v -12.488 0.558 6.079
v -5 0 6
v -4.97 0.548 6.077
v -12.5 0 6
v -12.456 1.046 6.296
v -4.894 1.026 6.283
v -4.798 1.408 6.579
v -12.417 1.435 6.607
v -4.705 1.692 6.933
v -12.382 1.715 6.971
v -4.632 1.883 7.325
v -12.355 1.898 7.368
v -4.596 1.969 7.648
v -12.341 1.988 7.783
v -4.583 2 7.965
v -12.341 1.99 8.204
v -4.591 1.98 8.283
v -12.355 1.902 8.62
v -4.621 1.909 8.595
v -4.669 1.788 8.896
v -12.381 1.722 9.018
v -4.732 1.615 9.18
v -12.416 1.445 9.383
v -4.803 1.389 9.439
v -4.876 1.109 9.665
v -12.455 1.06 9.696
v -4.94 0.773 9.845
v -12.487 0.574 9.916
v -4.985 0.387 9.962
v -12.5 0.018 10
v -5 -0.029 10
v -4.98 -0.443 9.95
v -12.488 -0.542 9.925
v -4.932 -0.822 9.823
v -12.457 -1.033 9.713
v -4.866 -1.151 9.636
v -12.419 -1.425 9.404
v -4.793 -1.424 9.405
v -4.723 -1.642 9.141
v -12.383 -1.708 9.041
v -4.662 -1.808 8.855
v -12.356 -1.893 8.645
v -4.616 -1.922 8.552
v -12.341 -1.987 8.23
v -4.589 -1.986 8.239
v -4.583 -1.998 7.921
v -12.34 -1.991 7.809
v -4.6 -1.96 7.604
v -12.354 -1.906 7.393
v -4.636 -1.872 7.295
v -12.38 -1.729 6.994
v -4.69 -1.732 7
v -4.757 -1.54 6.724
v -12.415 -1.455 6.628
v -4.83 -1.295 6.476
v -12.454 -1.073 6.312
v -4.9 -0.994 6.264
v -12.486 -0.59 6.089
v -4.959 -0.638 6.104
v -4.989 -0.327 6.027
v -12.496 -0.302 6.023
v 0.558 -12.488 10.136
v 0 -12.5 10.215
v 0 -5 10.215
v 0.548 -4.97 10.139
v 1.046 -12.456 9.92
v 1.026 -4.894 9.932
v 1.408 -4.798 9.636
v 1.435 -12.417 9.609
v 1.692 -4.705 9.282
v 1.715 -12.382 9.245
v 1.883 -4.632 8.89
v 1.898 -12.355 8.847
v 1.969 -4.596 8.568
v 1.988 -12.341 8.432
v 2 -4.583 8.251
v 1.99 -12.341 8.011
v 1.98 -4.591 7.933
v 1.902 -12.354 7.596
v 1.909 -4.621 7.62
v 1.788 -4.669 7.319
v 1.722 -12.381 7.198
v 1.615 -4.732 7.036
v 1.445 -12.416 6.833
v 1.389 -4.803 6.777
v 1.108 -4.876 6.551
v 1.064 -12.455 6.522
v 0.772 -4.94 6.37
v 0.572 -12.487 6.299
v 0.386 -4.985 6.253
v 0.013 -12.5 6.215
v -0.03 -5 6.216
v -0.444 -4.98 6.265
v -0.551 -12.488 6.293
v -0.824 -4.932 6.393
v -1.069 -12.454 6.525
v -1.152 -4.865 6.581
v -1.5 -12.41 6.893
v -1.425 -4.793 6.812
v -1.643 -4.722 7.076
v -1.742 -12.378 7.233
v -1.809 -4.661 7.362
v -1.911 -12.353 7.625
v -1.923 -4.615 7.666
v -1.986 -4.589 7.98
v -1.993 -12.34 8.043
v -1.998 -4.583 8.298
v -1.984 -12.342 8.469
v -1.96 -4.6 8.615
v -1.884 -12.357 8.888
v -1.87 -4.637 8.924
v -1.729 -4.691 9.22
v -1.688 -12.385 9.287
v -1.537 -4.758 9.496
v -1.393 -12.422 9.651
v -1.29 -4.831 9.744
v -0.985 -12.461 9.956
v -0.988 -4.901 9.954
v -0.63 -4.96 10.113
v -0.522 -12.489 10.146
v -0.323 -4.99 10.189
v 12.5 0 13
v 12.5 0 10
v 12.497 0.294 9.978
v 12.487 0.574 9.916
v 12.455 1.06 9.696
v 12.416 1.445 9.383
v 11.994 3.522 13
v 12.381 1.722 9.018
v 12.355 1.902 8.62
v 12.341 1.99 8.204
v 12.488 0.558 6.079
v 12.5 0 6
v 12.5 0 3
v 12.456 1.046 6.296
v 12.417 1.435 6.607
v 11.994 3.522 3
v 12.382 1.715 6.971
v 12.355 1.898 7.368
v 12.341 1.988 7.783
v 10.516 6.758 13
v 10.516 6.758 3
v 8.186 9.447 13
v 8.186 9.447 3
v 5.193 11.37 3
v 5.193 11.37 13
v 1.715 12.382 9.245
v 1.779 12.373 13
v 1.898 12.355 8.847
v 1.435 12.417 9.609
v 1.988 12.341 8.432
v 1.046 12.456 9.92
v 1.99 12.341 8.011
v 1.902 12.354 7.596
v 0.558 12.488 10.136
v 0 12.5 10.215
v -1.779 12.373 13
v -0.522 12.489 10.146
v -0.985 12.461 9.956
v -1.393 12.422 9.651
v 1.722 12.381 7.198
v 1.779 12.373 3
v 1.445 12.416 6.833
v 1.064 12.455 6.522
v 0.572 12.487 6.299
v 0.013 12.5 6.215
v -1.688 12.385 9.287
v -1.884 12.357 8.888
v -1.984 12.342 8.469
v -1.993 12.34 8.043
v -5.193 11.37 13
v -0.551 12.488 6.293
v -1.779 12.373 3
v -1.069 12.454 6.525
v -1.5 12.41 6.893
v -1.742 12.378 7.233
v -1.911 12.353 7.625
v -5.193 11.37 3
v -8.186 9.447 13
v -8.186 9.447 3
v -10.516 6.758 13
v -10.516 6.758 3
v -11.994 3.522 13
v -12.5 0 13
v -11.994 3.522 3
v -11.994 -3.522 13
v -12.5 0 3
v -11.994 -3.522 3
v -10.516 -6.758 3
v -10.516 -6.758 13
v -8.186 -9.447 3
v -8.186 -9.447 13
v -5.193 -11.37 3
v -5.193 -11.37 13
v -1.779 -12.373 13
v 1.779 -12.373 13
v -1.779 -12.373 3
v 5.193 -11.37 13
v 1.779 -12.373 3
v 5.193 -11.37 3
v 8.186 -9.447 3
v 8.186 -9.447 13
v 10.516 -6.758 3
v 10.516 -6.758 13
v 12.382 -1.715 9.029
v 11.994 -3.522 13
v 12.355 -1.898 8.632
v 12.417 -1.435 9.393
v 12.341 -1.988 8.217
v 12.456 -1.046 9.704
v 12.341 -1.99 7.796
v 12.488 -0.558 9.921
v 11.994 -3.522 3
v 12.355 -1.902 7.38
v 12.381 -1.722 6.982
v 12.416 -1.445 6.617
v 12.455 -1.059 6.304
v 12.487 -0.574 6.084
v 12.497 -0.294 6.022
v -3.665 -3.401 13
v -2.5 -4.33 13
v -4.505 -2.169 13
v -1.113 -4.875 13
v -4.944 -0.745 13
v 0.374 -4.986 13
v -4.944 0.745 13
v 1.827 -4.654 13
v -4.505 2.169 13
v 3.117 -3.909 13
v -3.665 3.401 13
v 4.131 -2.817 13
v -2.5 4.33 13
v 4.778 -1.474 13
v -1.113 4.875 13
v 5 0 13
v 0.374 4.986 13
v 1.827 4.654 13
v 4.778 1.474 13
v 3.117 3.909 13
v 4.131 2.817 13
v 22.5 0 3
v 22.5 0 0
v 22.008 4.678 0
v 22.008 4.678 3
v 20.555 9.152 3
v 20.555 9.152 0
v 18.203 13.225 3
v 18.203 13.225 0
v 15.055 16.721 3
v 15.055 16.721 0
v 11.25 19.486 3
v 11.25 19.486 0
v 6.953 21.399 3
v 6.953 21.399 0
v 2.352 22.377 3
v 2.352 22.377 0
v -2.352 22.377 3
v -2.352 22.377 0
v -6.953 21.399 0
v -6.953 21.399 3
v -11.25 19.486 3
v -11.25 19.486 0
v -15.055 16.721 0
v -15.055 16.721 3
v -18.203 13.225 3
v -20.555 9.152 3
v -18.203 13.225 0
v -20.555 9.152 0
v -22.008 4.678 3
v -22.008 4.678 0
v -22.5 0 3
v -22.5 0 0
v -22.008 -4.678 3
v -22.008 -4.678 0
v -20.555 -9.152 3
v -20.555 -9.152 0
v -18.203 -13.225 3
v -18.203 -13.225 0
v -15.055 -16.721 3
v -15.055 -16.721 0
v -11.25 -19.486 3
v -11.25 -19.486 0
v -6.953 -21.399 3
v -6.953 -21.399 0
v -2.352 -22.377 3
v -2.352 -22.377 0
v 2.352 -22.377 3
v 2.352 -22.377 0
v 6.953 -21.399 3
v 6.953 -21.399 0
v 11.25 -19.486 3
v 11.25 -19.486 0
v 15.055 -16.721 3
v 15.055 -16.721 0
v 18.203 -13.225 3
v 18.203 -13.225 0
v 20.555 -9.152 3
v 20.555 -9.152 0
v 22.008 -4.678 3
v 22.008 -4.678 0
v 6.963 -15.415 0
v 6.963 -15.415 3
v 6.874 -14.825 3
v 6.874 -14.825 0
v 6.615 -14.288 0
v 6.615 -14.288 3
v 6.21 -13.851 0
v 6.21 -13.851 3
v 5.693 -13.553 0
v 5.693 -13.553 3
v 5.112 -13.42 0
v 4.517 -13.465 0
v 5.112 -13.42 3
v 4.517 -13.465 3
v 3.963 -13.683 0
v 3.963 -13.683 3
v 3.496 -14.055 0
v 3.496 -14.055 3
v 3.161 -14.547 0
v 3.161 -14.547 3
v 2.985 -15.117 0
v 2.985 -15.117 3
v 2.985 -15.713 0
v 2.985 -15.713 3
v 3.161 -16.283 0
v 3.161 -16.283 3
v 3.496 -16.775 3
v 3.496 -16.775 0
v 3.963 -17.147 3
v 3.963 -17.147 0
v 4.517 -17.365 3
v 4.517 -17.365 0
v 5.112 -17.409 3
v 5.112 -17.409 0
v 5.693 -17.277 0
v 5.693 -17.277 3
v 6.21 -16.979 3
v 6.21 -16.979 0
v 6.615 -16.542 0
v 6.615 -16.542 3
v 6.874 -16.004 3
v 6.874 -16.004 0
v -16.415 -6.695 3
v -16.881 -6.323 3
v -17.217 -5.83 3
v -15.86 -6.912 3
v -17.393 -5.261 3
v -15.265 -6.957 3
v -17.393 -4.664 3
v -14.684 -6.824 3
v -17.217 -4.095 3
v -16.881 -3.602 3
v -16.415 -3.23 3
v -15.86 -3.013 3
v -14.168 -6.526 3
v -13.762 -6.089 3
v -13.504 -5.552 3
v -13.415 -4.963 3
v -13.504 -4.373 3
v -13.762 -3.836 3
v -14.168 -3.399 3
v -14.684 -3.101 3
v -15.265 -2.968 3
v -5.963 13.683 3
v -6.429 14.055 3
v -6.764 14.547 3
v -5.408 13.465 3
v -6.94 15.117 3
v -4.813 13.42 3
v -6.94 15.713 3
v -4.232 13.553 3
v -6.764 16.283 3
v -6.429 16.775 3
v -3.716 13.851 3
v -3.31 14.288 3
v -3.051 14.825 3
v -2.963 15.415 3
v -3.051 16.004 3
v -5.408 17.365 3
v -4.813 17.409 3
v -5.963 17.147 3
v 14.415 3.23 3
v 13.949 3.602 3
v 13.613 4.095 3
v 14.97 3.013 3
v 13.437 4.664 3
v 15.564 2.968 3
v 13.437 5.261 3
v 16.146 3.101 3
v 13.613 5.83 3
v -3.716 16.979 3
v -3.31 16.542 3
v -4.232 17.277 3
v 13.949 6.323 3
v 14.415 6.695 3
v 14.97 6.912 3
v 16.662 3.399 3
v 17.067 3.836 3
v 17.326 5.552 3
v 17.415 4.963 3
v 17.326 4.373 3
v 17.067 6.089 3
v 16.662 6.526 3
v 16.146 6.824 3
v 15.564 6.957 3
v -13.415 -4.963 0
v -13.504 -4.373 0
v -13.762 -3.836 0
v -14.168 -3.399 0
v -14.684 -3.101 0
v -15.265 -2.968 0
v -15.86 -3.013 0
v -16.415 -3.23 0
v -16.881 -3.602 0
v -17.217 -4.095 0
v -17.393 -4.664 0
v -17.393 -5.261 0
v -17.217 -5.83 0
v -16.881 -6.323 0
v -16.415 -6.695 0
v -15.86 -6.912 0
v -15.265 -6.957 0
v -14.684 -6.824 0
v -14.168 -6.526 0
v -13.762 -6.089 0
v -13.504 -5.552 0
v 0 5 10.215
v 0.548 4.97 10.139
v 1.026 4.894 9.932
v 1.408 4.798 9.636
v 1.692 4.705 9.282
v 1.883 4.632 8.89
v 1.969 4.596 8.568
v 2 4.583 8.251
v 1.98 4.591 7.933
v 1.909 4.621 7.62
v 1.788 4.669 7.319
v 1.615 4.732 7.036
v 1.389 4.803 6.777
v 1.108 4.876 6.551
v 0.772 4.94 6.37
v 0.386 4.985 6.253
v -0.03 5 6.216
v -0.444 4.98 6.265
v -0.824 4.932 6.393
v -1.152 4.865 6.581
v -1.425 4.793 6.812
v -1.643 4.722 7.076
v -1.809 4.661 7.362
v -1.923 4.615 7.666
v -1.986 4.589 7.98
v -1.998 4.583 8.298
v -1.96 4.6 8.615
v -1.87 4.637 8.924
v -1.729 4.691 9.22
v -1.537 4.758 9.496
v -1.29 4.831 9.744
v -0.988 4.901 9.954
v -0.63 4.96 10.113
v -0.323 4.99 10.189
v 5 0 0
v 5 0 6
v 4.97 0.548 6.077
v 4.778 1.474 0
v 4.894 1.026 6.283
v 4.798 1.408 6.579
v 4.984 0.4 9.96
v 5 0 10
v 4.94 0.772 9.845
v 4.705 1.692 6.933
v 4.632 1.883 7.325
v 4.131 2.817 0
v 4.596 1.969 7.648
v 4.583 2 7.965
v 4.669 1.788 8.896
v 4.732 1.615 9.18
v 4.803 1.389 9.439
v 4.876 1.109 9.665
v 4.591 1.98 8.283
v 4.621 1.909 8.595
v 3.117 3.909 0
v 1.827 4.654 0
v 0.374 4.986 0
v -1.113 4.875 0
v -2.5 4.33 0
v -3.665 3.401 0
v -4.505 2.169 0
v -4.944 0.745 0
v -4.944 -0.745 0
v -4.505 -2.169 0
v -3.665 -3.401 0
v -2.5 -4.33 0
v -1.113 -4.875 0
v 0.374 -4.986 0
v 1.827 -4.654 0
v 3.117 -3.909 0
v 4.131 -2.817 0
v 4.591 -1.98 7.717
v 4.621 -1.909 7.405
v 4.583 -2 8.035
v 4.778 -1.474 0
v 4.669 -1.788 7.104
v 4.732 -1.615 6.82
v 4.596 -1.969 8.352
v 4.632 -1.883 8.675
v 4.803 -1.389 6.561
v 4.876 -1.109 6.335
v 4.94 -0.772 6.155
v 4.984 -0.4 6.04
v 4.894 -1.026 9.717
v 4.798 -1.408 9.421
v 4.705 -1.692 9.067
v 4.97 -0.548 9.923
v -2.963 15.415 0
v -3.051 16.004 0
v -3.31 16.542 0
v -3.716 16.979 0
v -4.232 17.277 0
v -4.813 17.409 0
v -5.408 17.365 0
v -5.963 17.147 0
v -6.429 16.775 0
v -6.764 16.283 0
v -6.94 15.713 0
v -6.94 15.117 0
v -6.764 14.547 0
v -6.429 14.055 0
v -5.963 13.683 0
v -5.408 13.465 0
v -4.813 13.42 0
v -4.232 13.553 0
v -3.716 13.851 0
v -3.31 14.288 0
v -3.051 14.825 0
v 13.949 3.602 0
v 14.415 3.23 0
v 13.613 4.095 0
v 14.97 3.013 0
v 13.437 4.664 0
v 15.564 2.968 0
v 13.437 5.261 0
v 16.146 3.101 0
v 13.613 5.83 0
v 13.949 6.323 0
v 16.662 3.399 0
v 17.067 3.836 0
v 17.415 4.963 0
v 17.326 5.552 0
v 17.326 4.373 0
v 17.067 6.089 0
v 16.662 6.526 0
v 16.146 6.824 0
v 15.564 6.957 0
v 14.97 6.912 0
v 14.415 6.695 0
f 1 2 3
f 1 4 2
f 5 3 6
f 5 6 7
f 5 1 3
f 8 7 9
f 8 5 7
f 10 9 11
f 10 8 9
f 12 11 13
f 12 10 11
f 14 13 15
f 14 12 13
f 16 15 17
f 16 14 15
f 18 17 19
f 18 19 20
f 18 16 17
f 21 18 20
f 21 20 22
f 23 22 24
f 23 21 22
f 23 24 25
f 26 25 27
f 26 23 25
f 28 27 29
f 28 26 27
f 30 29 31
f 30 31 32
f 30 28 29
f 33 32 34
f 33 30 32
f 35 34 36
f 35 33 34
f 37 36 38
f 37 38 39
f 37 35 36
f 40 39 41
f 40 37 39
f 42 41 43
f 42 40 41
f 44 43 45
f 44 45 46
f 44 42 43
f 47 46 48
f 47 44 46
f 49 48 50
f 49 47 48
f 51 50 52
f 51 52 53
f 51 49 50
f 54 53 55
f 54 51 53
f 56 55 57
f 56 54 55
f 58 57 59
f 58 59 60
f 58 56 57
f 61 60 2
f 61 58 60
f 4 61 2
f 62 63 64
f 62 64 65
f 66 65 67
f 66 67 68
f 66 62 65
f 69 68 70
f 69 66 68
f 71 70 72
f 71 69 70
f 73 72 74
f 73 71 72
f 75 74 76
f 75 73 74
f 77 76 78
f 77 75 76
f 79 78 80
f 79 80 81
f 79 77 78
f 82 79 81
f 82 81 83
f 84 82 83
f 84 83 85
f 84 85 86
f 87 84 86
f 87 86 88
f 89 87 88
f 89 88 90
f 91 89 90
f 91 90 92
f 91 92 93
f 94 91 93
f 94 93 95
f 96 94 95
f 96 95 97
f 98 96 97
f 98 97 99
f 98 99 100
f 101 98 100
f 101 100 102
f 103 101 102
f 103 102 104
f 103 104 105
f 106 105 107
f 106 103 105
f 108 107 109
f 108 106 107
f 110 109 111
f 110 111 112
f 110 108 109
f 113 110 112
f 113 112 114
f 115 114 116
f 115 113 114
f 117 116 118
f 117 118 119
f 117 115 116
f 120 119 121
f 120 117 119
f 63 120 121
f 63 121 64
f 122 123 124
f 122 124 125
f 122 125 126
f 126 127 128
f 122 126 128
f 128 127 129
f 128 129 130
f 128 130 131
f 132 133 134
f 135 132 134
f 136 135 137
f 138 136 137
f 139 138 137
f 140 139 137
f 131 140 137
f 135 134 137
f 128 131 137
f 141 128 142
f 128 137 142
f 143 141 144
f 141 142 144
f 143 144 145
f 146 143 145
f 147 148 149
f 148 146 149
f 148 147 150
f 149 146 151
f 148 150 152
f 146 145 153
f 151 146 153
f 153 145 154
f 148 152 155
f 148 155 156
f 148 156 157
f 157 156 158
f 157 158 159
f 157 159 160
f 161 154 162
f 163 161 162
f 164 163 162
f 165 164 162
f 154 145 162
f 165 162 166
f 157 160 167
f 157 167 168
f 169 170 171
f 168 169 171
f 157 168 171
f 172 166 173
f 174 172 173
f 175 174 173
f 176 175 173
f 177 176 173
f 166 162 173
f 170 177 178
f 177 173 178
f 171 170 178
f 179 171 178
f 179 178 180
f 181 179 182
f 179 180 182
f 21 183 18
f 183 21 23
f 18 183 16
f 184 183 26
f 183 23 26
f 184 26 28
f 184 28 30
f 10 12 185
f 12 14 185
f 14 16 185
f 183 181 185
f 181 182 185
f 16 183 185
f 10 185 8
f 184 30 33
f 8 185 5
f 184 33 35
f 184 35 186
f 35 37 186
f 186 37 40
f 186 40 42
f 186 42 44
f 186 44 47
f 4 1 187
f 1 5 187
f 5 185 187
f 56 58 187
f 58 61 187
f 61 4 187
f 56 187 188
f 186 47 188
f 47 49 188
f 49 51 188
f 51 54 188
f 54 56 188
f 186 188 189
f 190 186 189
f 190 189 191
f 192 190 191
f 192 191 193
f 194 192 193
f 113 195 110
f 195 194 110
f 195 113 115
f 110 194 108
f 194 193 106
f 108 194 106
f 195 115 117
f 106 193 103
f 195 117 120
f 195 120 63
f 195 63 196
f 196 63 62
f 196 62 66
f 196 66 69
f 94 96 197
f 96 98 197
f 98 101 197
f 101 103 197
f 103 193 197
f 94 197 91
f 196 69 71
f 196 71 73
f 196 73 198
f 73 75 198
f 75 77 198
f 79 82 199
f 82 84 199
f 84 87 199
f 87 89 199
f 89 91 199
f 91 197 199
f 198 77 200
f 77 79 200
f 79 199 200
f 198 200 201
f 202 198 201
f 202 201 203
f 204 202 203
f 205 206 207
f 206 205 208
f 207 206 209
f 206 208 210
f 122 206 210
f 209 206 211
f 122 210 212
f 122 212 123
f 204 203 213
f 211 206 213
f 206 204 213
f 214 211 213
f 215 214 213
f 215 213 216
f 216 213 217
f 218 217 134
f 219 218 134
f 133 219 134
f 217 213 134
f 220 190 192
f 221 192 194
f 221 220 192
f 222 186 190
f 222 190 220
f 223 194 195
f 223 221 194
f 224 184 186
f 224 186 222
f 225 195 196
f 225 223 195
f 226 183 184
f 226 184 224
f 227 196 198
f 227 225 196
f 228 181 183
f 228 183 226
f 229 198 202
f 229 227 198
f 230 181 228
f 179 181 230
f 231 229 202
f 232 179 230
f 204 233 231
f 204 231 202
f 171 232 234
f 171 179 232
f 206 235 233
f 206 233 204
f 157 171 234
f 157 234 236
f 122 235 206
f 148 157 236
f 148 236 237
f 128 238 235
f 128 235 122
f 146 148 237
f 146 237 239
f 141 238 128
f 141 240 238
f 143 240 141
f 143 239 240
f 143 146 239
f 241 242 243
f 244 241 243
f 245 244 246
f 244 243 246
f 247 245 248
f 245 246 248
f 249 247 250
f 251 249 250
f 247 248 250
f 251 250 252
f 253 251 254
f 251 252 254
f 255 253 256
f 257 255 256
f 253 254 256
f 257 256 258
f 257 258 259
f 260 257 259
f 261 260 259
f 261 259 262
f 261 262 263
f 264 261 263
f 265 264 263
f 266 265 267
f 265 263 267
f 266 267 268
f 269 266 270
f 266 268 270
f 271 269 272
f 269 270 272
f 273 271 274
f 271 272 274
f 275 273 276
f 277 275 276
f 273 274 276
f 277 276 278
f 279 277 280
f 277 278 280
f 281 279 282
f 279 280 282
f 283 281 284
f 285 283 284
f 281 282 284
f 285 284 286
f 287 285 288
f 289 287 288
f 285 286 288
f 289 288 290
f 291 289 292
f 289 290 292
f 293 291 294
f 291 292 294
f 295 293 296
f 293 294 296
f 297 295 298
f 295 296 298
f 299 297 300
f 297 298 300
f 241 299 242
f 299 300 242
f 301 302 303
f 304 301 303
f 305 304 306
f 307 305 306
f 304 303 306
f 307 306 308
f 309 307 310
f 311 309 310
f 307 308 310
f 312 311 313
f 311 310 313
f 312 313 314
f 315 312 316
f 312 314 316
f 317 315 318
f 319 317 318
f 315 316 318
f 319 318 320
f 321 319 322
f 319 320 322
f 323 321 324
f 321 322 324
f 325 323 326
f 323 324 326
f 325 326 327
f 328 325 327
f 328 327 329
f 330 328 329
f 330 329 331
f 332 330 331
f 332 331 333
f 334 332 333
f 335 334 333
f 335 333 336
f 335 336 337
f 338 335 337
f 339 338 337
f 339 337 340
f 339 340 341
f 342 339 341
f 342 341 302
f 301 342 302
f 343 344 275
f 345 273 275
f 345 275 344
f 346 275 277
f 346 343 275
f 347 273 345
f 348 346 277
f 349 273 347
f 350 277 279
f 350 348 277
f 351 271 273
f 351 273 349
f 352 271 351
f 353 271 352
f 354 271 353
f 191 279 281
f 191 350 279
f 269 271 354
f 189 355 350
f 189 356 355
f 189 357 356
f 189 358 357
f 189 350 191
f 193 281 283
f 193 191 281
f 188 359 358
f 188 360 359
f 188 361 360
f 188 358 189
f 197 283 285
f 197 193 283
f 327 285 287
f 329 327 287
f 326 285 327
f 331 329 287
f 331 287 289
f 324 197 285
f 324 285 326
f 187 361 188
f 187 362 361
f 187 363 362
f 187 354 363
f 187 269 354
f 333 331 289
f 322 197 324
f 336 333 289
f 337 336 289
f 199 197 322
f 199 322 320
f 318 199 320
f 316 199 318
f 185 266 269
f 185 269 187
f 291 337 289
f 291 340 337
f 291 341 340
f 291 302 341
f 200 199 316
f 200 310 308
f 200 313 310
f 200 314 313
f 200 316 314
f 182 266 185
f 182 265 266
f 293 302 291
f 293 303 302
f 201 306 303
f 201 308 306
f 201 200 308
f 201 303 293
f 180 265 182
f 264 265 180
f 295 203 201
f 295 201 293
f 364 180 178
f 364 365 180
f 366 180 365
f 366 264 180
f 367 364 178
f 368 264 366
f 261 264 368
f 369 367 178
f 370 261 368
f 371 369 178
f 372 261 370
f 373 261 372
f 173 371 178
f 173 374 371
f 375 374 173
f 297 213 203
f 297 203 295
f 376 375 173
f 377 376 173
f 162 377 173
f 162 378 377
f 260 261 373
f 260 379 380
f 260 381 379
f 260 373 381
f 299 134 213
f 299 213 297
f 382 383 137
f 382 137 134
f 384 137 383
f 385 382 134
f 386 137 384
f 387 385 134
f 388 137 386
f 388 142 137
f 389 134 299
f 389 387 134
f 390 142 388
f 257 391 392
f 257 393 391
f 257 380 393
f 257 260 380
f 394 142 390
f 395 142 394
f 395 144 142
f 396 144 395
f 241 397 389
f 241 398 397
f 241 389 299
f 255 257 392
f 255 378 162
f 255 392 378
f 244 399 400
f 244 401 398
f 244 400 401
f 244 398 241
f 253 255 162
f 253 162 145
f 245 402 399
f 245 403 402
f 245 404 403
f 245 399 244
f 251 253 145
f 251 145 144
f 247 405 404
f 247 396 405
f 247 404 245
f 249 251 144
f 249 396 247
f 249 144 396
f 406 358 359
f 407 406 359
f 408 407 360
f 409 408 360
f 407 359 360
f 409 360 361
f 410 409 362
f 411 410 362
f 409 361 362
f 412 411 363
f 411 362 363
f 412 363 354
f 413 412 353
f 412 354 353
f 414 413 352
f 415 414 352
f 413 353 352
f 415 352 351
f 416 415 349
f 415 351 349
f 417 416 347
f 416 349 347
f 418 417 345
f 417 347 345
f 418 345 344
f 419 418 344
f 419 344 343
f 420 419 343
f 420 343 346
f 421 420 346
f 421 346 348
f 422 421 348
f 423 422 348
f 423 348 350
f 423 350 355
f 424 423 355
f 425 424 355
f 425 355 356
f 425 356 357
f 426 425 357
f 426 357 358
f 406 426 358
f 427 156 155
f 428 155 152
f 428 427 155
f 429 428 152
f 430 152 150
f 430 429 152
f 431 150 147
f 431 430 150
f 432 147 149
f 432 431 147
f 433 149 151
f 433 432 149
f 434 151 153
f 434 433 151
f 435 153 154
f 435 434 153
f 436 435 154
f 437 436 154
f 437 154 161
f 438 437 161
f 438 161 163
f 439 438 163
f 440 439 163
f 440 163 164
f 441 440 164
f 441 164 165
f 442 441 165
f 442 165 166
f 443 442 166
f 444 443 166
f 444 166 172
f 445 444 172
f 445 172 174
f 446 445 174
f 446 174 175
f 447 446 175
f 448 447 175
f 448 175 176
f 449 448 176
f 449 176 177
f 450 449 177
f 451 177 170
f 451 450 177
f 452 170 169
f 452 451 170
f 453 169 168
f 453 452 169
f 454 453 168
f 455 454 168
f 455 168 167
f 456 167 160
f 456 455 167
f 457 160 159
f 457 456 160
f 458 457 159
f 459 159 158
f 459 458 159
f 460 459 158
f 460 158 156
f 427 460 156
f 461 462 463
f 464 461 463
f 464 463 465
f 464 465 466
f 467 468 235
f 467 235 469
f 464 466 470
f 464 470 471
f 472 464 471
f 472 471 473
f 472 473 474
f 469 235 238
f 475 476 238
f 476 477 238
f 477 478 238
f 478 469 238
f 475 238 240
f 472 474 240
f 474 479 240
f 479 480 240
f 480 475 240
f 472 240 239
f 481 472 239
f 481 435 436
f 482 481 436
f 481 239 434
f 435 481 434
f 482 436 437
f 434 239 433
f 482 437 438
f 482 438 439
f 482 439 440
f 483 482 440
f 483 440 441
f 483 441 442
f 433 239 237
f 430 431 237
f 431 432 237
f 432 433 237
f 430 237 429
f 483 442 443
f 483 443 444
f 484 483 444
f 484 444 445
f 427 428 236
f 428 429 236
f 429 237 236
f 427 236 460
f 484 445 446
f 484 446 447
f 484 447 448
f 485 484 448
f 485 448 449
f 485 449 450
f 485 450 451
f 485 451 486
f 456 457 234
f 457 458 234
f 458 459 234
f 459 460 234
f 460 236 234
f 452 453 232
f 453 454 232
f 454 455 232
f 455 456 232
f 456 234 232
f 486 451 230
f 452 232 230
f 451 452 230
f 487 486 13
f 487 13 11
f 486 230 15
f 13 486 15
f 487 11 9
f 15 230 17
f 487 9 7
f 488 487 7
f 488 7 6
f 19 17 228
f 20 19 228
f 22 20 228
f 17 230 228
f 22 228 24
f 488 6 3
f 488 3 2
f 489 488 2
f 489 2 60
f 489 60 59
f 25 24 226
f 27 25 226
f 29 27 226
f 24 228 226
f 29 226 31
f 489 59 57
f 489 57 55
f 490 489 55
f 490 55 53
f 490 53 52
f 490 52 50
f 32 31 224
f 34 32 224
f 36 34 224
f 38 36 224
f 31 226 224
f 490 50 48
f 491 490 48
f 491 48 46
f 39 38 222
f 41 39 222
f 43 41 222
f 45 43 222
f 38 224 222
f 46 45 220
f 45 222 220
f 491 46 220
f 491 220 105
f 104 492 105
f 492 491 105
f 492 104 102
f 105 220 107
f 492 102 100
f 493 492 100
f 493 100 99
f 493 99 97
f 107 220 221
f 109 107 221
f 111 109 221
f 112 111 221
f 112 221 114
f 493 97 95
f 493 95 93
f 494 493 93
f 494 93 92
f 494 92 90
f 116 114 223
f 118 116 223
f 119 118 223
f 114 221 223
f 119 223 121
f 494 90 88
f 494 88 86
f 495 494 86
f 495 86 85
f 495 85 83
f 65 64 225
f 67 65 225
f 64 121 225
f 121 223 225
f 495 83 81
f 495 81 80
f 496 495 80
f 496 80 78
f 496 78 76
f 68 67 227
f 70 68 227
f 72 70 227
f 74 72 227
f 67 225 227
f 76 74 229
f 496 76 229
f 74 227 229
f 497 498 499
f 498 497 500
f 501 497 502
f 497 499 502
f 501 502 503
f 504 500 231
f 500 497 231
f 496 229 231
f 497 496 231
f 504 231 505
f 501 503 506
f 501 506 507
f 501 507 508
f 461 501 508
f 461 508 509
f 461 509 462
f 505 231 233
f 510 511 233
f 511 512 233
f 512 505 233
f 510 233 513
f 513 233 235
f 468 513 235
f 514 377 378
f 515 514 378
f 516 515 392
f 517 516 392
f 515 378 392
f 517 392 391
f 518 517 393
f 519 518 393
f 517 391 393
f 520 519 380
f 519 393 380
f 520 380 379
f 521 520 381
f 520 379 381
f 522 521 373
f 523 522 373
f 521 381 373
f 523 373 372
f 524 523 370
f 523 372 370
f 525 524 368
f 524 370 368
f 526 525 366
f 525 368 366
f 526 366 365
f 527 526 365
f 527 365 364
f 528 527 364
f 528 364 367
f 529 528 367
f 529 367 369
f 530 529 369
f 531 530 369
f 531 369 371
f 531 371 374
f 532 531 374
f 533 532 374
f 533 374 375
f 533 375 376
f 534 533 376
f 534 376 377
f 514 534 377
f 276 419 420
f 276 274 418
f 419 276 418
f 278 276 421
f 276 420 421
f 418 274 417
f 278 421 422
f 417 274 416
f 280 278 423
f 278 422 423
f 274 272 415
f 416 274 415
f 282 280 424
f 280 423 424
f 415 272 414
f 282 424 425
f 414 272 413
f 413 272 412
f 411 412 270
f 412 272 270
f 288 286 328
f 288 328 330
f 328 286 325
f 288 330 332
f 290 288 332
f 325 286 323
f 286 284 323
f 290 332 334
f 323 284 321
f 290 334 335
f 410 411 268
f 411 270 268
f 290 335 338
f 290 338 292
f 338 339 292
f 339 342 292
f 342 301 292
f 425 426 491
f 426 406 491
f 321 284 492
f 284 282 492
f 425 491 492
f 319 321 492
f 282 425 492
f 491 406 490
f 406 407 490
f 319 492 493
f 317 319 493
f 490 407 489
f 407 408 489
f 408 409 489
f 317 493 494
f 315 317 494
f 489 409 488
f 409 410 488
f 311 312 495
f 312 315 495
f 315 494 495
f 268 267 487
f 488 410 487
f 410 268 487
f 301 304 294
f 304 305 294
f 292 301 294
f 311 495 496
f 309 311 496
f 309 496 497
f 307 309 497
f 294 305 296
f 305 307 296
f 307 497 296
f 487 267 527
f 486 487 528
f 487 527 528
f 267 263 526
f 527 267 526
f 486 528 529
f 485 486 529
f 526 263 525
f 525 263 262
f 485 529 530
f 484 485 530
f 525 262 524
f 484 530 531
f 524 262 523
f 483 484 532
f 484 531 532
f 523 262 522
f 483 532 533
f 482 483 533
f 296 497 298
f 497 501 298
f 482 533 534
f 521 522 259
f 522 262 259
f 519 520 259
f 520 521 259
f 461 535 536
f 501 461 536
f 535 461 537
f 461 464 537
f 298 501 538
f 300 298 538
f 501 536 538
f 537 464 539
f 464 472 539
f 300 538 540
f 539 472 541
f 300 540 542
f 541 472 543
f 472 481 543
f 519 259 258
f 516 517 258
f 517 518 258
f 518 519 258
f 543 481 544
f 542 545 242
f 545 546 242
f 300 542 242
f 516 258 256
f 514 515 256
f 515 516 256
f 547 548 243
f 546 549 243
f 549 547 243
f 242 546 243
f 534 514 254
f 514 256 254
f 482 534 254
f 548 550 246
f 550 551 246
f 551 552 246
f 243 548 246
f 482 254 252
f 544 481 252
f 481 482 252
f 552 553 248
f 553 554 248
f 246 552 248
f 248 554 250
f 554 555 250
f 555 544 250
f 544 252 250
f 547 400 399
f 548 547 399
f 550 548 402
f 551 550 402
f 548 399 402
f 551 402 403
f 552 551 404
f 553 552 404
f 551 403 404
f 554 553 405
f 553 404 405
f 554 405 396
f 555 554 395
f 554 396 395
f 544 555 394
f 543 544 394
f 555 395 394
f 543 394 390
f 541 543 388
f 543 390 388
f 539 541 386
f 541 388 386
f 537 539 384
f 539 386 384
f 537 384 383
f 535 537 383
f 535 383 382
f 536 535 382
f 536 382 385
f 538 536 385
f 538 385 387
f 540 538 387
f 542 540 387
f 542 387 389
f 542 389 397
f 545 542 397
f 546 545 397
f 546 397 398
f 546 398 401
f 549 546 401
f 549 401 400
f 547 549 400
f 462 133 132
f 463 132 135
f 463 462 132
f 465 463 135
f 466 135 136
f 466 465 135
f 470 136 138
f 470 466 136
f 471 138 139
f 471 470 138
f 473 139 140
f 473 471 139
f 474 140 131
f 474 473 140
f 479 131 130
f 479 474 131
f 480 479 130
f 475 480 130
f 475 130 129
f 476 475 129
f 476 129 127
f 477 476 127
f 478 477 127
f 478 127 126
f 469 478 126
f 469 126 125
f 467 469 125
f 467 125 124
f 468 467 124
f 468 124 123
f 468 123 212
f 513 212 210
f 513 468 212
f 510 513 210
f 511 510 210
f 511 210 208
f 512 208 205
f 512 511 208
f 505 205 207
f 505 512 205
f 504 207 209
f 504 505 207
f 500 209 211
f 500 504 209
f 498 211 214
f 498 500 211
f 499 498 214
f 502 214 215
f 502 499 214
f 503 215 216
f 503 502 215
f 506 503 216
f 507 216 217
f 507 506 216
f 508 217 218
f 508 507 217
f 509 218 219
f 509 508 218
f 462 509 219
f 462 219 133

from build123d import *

# Parameters (mm, degrees)
CROQUIS1_R                 = 22.5
SALIENTE_EXTRUIR1_DEPTH    = 3
CROQUIS2_R                 = 12.5
SALIENTE_EXTRUIR2_DEPTH    = 10
CROQUIS3_R                 = 5
CORTAR_EXTRUIR1_DEPTH      = 35.372954485
CROQUIS4_R                 = 2
CORTAR_EXTRUIR2_DEPTH      = 34.35416016
CORTAR_EXTRUIR3_DEPTH      = 35.372954485
CORTAR_EXTRUIR3_DEPTH_BACK = 35.372954485
CROQUIS5_R                 = 2
CORTAR_EXTRUIR4_DEPTH      = 35.372954522
CORTAR_EXTRUIR4_DEPTH_BACK = 35.372954522
CROQUIS6_R                 = 2


with BuildPart() as part:
    # Croquis1 → Saliente-Extruir1 (new body)
    with BuildSketch(Plane.XY):
        Circle(CROQUIS1_R)
    extrude(amount=SALIENTE_EXTRUIR1_DEPTH)

    # Croquis2 → Saliente-Extruir2 (add)
    with BuildSketch(Plane.XY.offset(3)):
        Circle(CROQUIS2_R)
    extrude(amount=SALIENTE_EXTRUIR2_DEPTH)

    # Croquis3 → Cortar-Extruir1 (cut, through all)
    with BuildSketch(Plane.XY.offset(13)):
        Circle(CROQUIS3_R)
    extrude(amount=-CORTAR_EXTRUIR1_DEPTH, mode=Mode.SUBTRACT)

    # Croquis4 → Cortar-Extruir2 (cut, through all)
    with BuildSketch(Plane.XY.offset(3)):
        with Locations((-4.962538649, 15.414885677)):
            Circle(CROQUIS4_R)
        with Locations((15.414885677, 4.962538649)):
            Circle(CROQUIS4_R)
        with Locations((4.962538649, -15.414885677)):
            Circle(CROQUIS4_R)
        with Locations((-15.414885677, -4.962538649)):
            Circle(CROQUIS4_R)
    extrude(amount=-CORTAR_EXTRUIR2_DEPTH, mode=Mode.SUBTRACT)

    # Croquis5 → Cortar-Extruir3 (cut, two sides: drawn at the far end of the back side and taken through both)
    with BuildSketch(Plane(origin=(0, 0, 0), x_dir=(0, 0, -1), z_dir=(1, 0, 0)).offset(-CORTAR_EXTRUIR3_DEPTH_BACK)):
        with Locations((-8, 0)):
            Circle(CROQUIS5_R)
    extrude(amount=CORTAR_EXTRUIR3_DEPTH + CORTAR_EXTRUIR3_DEPTH_BACK, mode=Mode.SUBTRACT)

    # Croquis6 → Cortar-Extruir4 (cut, two sides: drawn at the far end of the back side and taken through both)
    with BuildSketch(Plane(origin=(0, 0, 0), x_dir=(1, 0, 0), z_dir=(0, 1, 0)).offset(-CORTAR_EXTRUIR4_DEPTH_BACK)):
        with Locations(Location((0, -8.215337569, 0), (0, 0, 270))):
            Circle(CROQUIS6_R)
    extrude(amount=CORTAR_EXTRUIR4_DEPTH + CORTAR_EXTRUIR4_DEPTH_BACK, mode=Mode.SUBTRACT)


solid = part.part
